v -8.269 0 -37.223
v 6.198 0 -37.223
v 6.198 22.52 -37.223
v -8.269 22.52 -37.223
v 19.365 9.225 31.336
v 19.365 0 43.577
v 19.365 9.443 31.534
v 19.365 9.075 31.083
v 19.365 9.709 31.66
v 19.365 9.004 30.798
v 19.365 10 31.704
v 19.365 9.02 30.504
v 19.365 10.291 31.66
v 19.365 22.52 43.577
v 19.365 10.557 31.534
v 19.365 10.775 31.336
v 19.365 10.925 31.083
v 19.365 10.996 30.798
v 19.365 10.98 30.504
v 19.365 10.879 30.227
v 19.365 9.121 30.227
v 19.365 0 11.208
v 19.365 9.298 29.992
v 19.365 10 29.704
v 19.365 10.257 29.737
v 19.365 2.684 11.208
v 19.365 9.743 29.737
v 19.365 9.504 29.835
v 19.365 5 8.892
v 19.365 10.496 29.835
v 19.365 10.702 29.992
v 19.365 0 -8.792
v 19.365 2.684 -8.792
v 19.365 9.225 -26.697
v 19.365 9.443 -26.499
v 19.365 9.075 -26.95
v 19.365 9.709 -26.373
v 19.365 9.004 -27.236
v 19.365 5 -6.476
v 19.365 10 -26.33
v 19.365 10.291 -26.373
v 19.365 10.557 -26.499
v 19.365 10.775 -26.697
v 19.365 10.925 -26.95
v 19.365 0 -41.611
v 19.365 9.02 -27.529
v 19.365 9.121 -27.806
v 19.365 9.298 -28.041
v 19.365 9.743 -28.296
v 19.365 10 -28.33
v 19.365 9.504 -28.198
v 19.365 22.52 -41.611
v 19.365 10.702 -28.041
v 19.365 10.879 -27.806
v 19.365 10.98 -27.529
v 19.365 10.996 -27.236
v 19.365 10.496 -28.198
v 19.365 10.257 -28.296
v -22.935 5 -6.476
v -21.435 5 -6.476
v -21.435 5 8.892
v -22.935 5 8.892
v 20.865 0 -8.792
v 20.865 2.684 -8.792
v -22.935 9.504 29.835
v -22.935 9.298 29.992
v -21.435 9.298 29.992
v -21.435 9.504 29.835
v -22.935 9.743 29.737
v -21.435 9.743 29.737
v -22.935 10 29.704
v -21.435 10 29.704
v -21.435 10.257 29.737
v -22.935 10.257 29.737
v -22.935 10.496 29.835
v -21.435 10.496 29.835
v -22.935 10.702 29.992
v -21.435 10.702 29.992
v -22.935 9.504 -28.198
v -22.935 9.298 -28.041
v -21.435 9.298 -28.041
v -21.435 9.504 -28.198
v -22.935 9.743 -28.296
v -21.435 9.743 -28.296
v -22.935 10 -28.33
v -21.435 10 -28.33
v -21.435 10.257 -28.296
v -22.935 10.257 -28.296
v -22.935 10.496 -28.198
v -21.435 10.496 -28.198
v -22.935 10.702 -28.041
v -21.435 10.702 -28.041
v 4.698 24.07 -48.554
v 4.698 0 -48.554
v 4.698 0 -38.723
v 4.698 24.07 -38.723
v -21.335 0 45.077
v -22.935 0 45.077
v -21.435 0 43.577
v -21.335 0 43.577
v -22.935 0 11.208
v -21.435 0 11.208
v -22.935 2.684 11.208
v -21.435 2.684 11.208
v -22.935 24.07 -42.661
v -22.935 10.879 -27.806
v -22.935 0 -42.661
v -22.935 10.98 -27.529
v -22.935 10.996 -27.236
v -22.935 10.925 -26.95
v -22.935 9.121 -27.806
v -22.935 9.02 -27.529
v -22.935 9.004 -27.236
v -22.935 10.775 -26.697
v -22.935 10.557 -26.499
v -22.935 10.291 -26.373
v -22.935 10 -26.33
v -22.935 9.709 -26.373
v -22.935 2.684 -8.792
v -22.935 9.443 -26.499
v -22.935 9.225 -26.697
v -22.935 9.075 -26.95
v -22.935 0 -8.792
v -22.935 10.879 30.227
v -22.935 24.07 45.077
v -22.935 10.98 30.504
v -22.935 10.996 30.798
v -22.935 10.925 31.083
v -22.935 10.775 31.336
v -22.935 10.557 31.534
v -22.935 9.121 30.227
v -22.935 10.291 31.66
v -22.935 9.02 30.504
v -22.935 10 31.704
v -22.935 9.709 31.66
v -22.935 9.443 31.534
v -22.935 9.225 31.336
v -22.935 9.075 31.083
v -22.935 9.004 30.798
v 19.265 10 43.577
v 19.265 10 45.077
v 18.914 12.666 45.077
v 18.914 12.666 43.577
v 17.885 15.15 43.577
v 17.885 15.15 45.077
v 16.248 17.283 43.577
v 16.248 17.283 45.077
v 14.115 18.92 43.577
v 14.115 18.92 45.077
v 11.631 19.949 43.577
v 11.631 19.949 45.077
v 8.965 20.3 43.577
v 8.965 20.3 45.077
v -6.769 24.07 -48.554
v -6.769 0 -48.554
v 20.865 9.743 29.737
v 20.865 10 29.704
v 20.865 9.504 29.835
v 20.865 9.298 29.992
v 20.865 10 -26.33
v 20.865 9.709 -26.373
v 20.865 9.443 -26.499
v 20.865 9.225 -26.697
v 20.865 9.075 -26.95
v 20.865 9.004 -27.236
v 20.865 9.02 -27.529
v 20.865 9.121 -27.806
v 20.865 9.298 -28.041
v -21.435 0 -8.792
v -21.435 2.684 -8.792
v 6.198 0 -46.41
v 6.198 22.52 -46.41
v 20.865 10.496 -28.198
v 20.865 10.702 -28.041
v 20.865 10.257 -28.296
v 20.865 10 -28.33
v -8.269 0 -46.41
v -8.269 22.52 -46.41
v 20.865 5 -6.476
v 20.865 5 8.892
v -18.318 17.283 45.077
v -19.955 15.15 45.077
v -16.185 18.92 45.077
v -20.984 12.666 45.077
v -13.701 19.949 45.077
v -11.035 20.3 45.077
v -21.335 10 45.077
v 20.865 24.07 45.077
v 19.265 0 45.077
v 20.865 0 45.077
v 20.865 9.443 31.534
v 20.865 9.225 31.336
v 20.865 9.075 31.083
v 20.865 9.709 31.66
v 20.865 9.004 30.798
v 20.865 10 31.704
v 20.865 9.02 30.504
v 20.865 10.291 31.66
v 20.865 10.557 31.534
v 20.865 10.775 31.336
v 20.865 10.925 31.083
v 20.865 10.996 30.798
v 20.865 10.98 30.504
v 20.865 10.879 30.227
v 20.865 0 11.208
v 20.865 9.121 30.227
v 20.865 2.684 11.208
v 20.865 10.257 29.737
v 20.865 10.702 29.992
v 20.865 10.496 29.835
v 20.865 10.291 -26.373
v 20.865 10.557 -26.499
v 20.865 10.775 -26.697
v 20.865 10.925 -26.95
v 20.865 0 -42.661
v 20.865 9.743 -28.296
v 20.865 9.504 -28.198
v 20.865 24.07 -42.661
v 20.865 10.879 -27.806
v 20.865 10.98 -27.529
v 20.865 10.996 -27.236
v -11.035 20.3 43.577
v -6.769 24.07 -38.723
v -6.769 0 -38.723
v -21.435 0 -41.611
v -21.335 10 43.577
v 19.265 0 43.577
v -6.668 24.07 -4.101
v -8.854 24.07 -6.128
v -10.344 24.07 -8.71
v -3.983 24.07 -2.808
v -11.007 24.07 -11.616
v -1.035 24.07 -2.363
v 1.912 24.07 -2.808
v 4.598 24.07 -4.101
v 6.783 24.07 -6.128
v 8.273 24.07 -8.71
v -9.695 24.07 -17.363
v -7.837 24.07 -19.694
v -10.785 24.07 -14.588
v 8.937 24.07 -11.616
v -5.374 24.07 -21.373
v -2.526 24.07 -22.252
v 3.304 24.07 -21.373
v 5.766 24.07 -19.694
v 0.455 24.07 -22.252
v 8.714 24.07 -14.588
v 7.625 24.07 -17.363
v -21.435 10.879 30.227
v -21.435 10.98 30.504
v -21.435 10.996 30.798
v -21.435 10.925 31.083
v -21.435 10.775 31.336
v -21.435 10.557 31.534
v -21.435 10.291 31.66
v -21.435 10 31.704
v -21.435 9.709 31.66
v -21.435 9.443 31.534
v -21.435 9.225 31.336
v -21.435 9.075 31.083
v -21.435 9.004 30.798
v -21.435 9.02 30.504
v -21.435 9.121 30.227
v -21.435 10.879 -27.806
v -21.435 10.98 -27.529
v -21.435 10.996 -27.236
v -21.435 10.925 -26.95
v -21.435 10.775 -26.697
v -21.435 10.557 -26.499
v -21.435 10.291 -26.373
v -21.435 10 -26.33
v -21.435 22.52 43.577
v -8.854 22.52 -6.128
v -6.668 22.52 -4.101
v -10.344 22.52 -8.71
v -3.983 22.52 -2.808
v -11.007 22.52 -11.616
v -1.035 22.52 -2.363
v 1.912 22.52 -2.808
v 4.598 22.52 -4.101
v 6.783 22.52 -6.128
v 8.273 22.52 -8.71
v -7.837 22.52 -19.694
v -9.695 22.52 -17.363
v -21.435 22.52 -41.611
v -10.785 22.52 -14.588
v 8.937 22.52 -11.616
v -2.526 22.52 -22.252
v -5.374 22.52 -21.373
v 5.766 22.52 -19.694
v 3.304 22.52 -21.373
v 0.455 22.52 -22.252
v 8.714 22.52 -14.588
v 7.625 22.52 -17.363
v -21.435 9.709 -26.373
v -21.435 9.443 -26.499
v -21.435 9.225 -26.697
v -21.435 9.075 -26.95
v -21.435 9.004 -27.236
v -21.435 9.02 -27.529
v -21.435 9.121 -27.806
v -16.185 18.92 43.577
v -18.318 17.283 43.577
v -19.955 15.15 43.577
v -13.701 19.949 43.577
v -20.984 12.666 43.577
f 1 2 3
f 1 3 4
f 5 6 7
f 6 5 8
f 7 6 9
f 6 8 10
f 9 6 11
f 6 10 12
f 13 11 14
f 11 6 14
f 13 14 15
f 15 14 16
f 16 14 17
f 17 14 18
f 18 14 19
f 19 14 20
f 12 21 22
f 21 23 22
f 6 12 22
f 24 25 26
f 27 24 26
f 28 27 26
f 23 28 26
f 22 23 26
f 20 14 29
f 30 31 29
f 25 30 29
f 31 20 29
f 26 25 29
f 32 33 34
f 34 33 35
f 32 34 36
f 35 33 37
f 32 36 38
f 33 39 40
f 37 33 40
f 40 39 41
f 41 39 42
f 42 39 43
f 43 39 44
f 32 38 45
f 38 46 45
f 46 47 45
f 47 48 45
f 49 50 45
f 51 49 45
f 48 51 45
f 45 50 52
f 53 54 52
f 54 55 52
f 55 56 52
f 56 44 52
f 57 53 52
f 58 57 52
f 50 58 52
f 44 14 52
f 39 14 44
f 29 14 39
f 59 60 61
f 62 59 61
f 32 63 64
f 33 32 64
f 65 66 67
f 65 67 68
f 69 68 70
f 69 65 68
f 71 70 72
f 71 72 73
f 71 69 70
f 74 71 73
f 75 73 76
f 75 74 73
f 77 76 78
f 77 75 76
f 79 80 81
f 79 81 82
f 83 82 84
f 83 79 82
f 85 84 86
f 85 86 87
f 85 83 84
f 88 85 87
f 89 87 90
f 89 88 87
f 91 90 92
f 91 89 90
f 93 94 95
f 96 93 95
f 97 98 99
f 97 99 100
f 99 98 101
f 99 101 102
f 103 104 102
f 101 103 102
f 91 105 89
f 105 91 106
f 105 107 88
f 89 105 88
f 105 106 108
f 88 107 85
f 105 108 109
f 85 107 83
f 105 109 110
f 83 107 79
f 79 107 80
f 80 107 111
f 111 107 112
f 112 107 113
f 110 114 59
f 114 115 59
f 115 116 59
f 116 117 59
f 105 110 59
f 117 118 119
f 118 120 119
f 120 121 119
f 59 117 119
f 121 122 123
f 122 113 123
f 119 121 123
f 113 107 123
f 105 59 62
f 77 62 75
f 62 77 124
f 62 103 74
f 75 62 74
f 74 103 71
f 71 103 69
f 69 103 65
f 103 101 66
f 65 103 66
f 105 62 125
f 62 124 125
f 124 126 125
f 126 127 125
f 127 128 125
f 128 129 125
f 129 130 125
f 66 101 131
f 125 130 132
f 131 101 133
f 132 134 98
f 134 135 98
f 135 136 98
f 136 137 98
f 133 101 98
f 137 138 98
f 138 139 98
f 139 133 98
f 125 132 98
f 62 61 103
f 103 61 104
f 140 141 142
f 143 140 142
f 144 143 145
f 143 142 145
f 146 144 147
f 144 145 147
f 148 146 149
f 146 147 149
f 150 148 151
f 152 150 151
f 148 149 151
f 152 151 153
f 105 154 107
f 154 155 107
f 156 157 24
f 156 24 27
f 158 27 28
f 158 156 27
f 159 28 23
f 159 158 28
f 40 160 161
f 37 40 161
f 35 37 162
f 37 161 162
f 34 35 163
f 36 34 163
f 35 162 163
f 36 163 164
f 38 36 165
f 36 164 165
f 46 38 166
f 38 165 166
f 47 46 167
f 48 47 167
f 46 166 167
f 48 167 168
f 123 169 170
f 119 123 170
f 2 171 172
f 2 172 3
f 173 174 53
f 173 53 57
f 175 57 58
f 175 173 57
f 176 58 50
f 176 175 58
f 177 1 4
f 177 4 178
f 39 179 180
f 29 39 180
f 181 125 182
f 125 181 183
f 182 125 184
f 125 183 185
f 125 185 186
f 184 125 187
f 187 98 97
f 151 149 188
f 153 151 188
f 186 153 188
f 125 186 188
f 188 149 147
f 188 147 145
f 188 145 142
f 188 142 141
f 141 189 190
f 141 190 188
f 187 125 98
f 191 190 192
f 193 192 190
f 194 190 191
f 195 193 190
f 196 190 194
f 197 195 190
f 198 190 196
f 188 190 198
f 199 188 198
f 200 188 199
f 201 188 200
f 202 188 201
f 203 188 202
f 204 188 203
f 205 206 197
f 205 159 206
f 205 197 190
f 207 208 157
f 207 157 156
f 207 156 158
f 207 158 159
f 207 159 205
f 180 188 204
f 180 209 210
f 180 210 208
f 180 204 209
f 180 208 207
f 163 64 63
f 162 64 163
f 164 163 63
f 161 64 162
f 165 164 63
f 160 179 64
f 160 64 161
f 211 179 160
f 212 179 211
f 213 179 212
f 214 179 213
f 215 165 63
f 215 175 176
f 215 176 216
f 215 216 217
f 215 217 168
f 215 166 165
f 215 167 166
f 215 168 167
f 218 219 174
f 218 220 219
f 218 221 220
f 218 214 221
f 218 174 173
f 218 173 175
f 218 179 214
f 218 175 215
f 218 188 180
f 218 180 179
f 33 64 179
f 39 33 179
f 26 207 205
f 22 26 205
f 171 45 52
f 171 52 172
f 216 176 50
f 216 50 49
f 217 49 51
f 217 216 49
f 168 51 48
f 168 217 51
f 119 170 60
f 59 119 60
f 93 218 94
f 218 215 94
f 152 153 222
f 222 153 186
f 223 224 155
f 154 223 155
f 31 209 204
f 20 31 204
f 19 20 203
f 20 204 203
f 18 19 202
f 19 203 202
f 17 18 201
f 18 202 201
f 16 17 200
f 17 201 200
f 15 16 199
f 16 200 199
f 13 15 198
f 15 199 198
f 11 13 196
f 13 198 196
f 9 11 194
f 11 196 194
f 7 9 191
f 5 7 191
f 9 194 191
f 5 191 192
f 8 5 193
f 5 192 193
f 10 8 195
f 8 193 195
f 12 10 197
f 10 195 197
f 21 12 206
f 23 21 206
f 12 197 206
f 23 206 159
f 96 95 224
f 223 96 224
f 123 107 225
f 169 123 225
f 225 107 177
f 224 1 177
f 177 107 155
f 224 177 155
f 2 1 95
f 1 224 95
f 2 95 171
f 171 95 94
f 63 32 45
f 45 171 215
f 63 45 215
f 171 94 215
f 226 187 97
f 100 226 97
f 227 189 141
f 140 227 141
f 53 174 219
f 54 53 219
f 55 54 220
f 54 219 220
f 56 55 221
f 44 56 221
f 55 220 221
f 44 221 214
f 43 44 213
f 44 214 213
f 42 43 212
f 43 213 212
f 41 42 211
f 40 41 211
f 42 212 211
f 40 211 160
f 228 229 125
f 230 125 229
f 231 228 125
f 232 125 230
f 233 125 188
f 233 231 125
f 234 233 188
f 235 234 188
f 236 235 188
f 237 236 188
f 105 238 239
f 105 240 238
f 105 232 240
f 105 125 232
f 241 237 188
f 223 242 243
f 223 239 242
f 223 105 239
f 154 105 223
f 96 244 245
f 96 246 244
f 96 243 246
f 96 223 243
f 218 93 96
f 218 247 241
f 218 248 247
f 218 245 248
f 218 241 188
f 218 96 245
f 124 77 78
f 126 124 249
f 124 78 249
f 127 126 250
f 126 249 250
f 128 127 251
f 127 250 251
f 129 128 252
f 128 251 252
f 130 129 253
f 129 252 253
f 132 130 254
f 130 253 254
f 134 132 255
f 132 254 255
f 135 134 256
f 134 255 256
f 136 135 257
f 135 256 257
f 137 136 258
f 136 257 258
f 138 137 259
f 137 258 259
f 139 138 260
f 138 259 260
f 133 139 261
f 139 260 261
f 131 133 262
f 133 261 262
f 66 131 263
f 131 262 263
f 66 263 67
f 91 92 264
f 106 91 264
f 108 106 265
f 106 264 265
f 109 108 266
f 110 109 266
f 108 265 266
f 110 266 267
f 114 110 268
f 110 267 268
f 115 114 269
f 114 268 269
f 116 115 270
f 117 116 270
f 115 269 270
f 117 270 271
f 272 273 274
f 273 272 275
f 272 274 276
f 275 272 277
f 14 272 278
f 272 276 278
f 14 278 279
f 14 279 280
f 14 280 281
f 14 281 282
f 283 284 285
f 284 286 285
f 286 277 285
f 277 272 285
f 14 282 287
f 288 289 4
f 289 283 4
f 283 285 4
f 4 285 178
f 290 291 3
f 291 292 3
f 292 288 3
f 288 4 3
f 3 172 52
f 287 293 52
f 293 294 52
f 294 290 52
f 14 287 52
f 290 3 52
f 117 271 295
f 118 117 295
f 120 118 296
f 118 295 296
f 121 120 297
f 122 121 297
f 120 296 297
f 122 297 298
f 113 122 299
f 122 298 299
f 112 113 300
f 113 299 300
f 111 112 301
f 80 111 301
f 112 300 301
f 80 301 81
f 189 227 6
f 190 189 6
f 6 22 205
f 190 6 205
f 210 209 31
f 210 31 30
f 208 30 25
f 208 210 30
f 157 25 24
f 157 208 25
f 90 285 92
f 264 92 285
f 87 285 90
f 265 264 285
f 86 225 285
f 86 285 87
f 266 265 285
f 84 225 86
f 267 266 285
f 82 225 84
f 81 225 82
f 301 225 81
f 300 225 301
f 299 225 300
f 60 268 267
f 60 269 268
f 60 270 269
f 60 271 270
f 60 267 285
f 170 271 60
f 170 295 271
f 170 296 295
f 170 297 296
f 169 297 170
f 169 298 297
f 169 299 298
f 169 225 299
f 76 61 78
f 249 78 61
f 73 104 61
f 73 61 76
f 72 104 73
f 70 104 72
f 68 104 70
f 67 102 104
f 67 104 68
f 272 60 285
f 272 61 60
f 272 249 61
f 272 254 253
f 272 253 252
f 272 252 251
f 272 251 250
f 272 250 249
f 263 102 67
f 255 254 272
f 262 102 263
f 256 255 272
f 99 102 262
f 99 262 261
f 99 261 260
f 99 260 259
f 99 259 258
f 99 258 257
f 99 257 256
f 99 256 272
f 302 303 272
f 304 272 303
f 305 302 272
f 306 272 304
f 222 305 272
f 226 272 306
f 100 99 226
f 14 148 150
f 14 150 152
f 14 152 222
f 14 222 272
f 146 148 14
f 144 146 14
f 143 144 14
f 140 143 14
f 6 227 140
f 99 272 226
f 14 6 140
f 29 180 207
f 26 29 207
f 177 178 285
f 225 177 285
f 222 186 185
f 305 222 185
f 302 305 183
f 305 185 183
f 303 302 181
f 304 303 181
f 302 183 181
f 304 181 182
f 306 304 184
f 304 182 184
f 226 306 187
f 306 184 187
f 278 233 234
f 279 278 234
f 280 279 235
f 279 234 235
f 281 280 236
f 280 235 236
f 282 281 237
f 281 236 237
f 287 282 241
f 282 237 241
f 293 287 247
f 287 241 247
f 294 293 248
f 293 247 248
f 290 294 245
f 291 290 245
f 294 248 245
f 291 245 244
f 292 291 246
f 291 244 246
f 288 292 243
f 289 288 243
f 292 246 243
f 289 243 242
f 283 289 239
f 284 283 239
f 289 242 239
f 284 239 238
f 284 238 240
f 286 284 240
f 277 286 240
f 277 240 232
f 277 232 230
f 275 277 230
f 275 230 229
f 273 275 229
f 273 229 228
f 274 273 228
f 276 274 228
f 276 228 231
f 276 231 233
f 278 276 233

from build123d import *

# Parameters (mm, degrees)
BOSS_EXTRUDE1_DEPTH = 50
BOSS_EXTRUDE2_DEPTH = 1.52
CUT_EXTRUDE2_DEPTH  = 1.52
CUT_EXTRUDE3_DEPTH  = 29
BOSS_EXTRUDE3_DEPTH = 1.55
SKETCH6_R           = 1
CUT_EXTRUDE4_DEPTH  = 77.55
CUT_EXTRUDE5_DEPTH  = 77.55
SKETCH8_R           = 1
CUT_EXTRUDE6_DEPTH  = 70
BOSS_EXTRUDE4_DEPTH = 1.5
BOSS_EXTRUDE5_DEPTH = 1.5
SKETCH12_R          = 10
CUT_EXTRUDE7_DEPTH  = 70


with BuildPart() as part:
    # Sketch1 → Boss-Extrude1 (new body)
    with BuildSketch(Plane(origin=(0, 0, 0), x_dir=(1, 0, 0), z_dir=(0, 1, 0))):
        Polygon((-22.935245878, -45.076760645), (20.864754122, -45.076760645), (20.864754122, 42.660744493), (4.698193973, 48.553690828), (4.698193973, 38.723239355), (-6.768685729, 38.723239355), (-6.768685729, 48.553690828), (-22.935245878, 42.660744493), align=None)
        Polygon((-21.435245878, -43.576760645), (19.364754122, -43.576760645), (19.364754122, 41.610970221), (6.198193973, 46.410372917), (6.198193973, 37.223239355), (-8.268685729, 37.223239355), (-8.268685729, 46.410372917), (-21.435245878, 41.610970221), align=None, mode=Mode.SUBTRACT)
    extrude(amount=BOSS_EXTRUDE1_DEPTH)

    # Sketch2 → Boss-Extrude2 (add)
    with BuildSketch(Plane(origin=(0, 50, 0), x_dir=(1, 0, 0), z_dir=(0, 1, 0))):
        Polygon((-22.935245878, 42.660744493), (-22.935245878, -45.076760645), (20.864754122, -45.076760645), (20.864754122, 42.660744493), (4.698193973, 48.553690828), (4.698193973, 38.723239355), (-6.768685729, 38.723239355), (-6.768685729, 48.553690828), align=None)
    extrude(amount=BOSS_EXTRUDE2_DEPTH)

    # Sketch3 → Cut-Extrude2 (cut)
    with BuildSketch(Plane.XY.offset(45.076760645)):
        with BuildLine():
            ThreePointArc((-11.035245878, 20), (-18.10631369, 17.071067812), (-21.035245878, 10))
            Line((-21.035245878, 10), (-21.035245878, 0))
            Line((-21.035245878, 0), (18.964754122, 0))
            Line((18.964754122, 0), (18.964754122, 10))
            ThreePointArc((18.964754122, 10), (16.035821934, 17.071067812), (8.964754122, 20))
            Line((8.964754122, 20), (-11.035245878, 20))
        make_face()
        with BuildLine():
            Line((-21.035245878, 0), (-21.035245878, 10))
            ThreePointArc((-21.035245878, 10), (-18.10631369, 17.071067812), (-11.035245878, 20))
            Line((-11.035245878, 20), (8.964754122, 20))
            ThreePointArc((8.964754122, 20), (16.035821934, 17.071067812), (18.964754122, 10))
            Line((18.964754122, 10), (18.964754122, 0))
            Line((18.964754122, 0), (19.264754122, 0))
            Line((19.264754122, 0), (19.264754122, 10))
            ThreePointArc((19.264754122, 10), (16.247953968, 17.283199846), (8.964754122, 20.3))
            Line((8.964754122, 20.3), (-11.035245878, 20.3))
            ThreePointArc((-11.035245878, 20.3), (-18.318445724, 17.283199846), (-21.335245878, 10))
            Line((-21.335245878, 10), (-21.335245878, 0))
            Line((-21.335245878, 0), (-21.035245878, 0))
        make_face()
    extrude(amount=-CUT_EXTRUDE2_DEPTH, mode=Mode.SUBTRACT)

    # Sketch4 → Cut-Extrude3 (cut)
    with BuildSketch(Plane(origin=(0, 51.52, 0), x_dir=(1, 0, 0), z_dir=(0, 1, 0))):
        Polygon((-6.768685729, 48.553690828), (-22.935245878, 42.660744493), (-22.935245878, -45.076760645), (20.864754122, -45.076760645), (20.864754122, 42.660744493), (4.698193973, 48.553690828), (4.698193973, 38.723239355), (-6.768685729, 38.723239355), align=None)
    extrude(amount=-CUT_EXTRUDE3_DEPTH, mode=Mode.SUBTRACT)

    # Sketch5 → Boss-Extrude3 (add)
    with BuildSketch(Plane(origin=(0, 22.52, 0), x_dir=(1, 0, 0), z_dir=(0, 1, 0))):
        Polygon((-6.768685729, 38.723239355), (-6.768685729, 48.553690828), (-22.935245878, 42.660744493), (-22.935245878, -45.076760645), (20.864754122, -45.076760645), (20.864754122, 42.660744493), (4.698193973, 48.553690828), (4.698193973, 38.723239355), align=None)
    extrude(amount=BOSS_EXTRUDE3_DEPTH)

    # Sketch6 → Cut-Extrude4 (cut)
    with BuildSketch(Plane(origin=(20.864754122, 0, 0), x_dir=(0, 0, -1), z_dir=(1, 0, 0))):
        with Locations((28.752953433, 10)):
            Circle(SKETCH6_R)
        with Locations((-29.280174862, 10)):
            Circle(SKETCH6_R)
    extrude(amount=-CUT_EXTRUDE4_DEPTH, mode=Mode.SUBTRACT)

    # Sketch7 → Cut-Extrude5 (cut)
    with BuildSketch(Plane(origin=(20.864754122, 0, 0), x_dir=(0, 0, -1), z_dir=(1, 0, 0))):
        Polygon((6.475840318, 5), (-8.89185647, 5), (-11.208008076, 2.683848394), (-11.208008076, 0), (8.791991924, 0), (8.791991924, 2.683848394), align=None)
    extrude(amount=-CUT_EXTRUDE5_DEPTH, mode=Mode.SUBTRACT)

    # Sketch8 → Cut-Extrude6 (cut)
    with BuildSketch(Plane(origin=(20.864754122, 0, 0), x_dir=(0, 0, -1), z_dir=(1, 0, 0))):
        with BuildLine():
            ThreePointArc((28.041256502, 10.702486639), (26.94988664, 10.925120784), (26.32955957, 10))
            Line((26.32955957, 10), (27.752953433, 10))
            ThreePointArc((27.752953433, 10), (27.827832649, 10.379672931), (28.041256502, 10.702486639))
        make_face()
        with BuildLine():
            Line((27.752953433, 10), (26.32955957, 10))
            ThreePointArc((26.32955957, 10), (26.94988664, 9.074879216), (28.041256502, 9.297513361))
            ThreePointArc((28.041256502, 9.297513361), (27.827832649, 9.620327069), (27.752953433, 10))
        make_face()
        with BuildLine():
            ThreePointArc((28.041256502, 10.702486639), (27.827832649, 10.379672931), (27.752953433, 10))
            Line((27.752953433, 10), (28.32955957, 10))
            ThreePointArc((28.32955957, 10), (28.254680355, 10.379672931), (28.041256502, 10.702486639))
        make_face()
        with BuildLine():
            Line((28.32955957, 10), (27.752953433, 10))
            ThreePointArc((27.752953433, 10), (27.827832649, 9.620327069), (28.041256502, 9.297513361))
            ThreePointArc((28.041256502, 9.297513361), (28.254680355, 9.620327069), (28.32955957, 10))
        make_face()
        with BuildLine():
            ThreePointArc((29.752953433, 10), (29.132626364, 10.925120784), (28.041256502, 10.702486639))
            ThreePointArc((28.041256502, 10.702486639), (28.254680355, 10.379672931), (28.32955957, 10))
            ThreePointArc((28.32955957, 10), (28.254680355, 9.620327069), (28.041256502, 9.297513361))
            ThreePointArc((28.041256502, 9.297513361), (29.132626364, 9.074879216), (29.752953433, 10))
        make_face()
        with Locations((-30.703568725, 10)):
            Circle(SKETCH8_R)
        with Locations((-29.280174862, 10)):
            Circle(SKETCH8_R)
    extrude(amount=-CUT_EXTRUDE6_DEPTH, mode=Mode.SUBTRACT)

    # Sketch10 → Boss-Extrude4 (add)
    with BuildSketch(Plane(origin=(20.864754122, 0, 0), x_dir=(0, 0, -1), z_dir=(1, 0, 0))):
        with BuildLine():
            ThreePointArc((-29.991871794, 9.297513361), (-28.280174862, 10), (-29.991871794, 10.702486639))
            ThreePointArc((-29.991871794, 10.702486639), (-29.778447941, 10.379672931), (-29.703568725, 10))
            ThreePointArc((-29.703568725, 10), (-29.778447941, 9.620327069), (-29.991871794, 9.297513361))
        make_face()
        with BuildLine():
            ThreePointArc((28.041256502, 10.702486639), (28.254680355, 10.379672931), (28.32955957, 10))
            ThreePointArc((28.32955957, 10), (28.254680355, 9.620327069), (28.041256502, 9.297513361))
            ThreePointArc((28.041256502, 9.297513361), (29.752953433, 10), (28.041256502, 10.702486639))
        make_face()
    extrude(amount=-BOSS_EXTRUDE4_DEPTH)

    # Sketch11 → Boss-Extrude5 (add)
    with BuildSketch(Plane.ZY.offset(22.935245878)):
        Polygon((-41.610970221, 22.52), (-41.610970221, 0), (-8.791991924, 0), (-8.791991924, 2.683848394), (-6.475840318, 5), (8.89185647, 5), (11.208008076, 2.683848394), (11.208008076, 0), (43.576760645, 0), (43.576760645, 22.52), align=None)
        with BuildLine():
            ThreePointArc((-28.041256502, 10.702486639), (-26.94988664, 10.925120784), (-26.32955957, 10))
            ThreePointArc((-26.32955957, 10), (-26.94988664, 9.074879216), (-28.041256502, 9.297513361))
            ThreePointArc((-28.041256502, 9.297513361), (-29.752953433, 10), (-28.041256502, 10.702486639))
        make_face(mode=Mode.SUBTRACT)
        with BuildLine():
            ThreePointArc((29.991871794, 10.702486639), (31.083241656, 10.925120784), (31.703568725, 10))
            ThreePointArc((31.703568725, 10), (31.083241656, 9.074879216), (29.991871794, 9.297513361))
            ThreePointArc((29.991871794, 9.297513361), (28.280174862, 10), (29.991871794, 10.702486639))
        make_face(mode=Mode.SUBTRACT)
        with BuildLine():
            ThreePointArc((29.991871794, 9.297513361), (29.703568725, 10), (29.991871794, 10.702486639))
            ThreePointArc((29.991871794, 10.702486639), (28.280174862, 10), (29.991871794, 9.297513361))
        make_face()
        with BuildLine():
            ThreePointArc((-28.041256502, 9.297513361), (-28.32955957, 10), (-28.041256502, 10.702486639))
            ThreePointArc((-28.041256502, 10.702486639), (-29.752953433, 10), (-28.041256502, 9.297513361))
        make_face()
    extrude(amount=-BOSS_EXTRUDE5_DEPTH)

    # Sketch12 → Cut-Extrude7 (cut)
    with BuildSketch(Plane(origin=(0, 24.07, 0), x_dir=(1, 0, 0), z_dir=(0, 1, 0))):
        with Locations(Location((-1.035245878, 12.363239355, 0), (0, 0, 270))):
            Circle(SKETCH12_R)
    extrude(amount=-CUT_EXTRUDE7_DEPTH, mode=Mode.SUBTRACT)


solid = part.part
